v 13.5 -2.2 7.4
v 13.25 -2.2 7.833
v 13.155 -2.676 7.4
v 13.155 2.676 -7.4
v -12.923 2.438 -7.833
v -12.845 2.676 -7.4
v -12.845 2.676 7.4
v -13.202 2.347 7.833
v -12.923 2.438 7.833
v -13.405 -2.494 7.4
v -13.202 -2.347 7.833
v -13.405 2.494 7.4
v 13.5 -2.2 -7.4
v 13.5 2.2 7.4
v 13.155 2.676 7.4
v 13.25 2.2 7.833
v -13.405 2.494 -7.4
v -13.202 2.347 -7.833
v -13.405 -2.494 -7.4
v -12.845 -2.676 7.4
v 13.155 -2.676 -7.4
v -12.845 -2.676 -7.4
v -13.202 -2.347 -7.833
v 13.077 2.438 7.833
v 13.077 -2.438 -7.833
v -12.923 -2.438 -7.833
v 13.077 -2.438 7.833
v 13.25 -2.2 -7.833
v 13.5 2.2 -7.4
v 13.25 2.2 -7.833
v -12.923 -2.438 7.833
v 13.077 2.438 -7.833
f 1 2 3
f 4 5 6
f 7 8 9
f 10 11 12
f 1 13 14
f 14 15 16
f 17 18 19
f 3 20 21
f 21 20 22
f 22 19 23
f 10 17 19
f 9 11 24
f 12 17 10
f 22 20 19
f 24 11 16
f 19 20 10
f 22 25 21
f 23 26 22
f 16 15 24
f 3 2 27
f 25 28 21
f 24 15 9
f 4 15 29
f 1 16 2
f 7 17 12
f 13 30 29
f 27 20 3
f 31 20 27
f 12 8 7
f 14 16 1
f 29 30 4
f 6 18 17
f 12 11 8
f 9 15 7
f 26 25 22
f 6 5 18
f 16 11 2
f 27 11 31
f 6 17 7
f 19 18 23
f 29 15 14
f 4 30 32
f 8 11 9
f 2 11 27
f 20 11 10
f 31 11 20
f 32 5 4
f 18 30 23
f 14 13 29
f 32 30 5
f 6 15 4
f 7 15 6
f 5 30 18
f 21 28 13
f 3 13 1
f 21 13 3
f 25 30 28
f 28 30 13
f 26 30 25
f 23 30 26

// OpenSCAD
EXT_WIDTH=0.6;
PLAY=0.2;

WIDTH_1=13;
WIDTH_2=27;

DEPTH_0=2*EXT_WIDTH;
DEPTH_1=7.9;
DEPTH_2=14.3;
DEPTH_3=17.5;

HEIGHT_1=2.7;
HEIGHT_2=16.3+PLAY;

HOLE_R=1.6;
HOLE_D=20.5;
HOLE_Z=4.5;

R_OUTSIDE=7.85+PLAY;
R_INSIDE=R_OUTSIDE-2*EXT_WIDTH;

R_SCREW=1.85+PLAY;

module base() {
    intersection() {
    minkowski() {
        cube([WIDTH_2-1,2*HEIGHT_1-1,2*DEPTH_1-1], center=true);
        sphere(r=0.5);
    }
    //translate([-50,0,0])
    //cube([100,100,100]);
    }
}

module hole() {
    translate([0,50,HOLE_Z])
    rotate([90,0,0])
    cylinder(100,r=HOLE_R,$fn=20);
}

module outer() {
    translate([0,HEIGHT_2-R_OUTSIDE,0])
    cylinder(DEPTH_3,r=R_OUTSIDE);
}

module inner() {
    translate([0,HEIGHT_2-R_OUTSIDE,-0.01])
    cylinder(DEPTH_2,r=R_INSIDE);
}

module screw() {
    translate([0,HEIGHT_2-R_OUTSIDE,-50])
    cylinder(100,r=R_SCREW, $fn=20);
}

module front() {
    intersection() {
        hull() {
            base();
            outer();
        }
        translate([-50,-50,0])
            cube([100,100,DEPTH_0]);
    }
}

module block() {
    translate([-WIDTH_1/2,0,0])
    cube([WIDTH_1,2*HEIGHT_1,DEPTH_1]);
}

module disc_hole() {
    translate([0,HEIGHT_2-R_OUTSIDE,DEPTH_3-0.5])
    minkowski() {
        cylinder(1,r=R_INSIDE-1,$fn=20);
        sphere(r=1);
    }
}

module close_hole() {
    translate([0,HEIGHT_2-R_OUTSIDE,DEPTH_2])
    cylinder(0.2,r=R_INSIDE);
}

module support() {
    translate([0,HEIGHT_2-R_OUTSIDE,0])
    difference() {
        cylinder(DEPTH_2,r=R_SCREW+EXT_WIDTH, $fn=20);
        cylinder(DEPTH_2,r=R_SCREW, $fn=20);
    }
}

//close_hole();
//support();

difference() {
    union() {
        //front();
        //outer();
        base();
        //block();
    }

}
